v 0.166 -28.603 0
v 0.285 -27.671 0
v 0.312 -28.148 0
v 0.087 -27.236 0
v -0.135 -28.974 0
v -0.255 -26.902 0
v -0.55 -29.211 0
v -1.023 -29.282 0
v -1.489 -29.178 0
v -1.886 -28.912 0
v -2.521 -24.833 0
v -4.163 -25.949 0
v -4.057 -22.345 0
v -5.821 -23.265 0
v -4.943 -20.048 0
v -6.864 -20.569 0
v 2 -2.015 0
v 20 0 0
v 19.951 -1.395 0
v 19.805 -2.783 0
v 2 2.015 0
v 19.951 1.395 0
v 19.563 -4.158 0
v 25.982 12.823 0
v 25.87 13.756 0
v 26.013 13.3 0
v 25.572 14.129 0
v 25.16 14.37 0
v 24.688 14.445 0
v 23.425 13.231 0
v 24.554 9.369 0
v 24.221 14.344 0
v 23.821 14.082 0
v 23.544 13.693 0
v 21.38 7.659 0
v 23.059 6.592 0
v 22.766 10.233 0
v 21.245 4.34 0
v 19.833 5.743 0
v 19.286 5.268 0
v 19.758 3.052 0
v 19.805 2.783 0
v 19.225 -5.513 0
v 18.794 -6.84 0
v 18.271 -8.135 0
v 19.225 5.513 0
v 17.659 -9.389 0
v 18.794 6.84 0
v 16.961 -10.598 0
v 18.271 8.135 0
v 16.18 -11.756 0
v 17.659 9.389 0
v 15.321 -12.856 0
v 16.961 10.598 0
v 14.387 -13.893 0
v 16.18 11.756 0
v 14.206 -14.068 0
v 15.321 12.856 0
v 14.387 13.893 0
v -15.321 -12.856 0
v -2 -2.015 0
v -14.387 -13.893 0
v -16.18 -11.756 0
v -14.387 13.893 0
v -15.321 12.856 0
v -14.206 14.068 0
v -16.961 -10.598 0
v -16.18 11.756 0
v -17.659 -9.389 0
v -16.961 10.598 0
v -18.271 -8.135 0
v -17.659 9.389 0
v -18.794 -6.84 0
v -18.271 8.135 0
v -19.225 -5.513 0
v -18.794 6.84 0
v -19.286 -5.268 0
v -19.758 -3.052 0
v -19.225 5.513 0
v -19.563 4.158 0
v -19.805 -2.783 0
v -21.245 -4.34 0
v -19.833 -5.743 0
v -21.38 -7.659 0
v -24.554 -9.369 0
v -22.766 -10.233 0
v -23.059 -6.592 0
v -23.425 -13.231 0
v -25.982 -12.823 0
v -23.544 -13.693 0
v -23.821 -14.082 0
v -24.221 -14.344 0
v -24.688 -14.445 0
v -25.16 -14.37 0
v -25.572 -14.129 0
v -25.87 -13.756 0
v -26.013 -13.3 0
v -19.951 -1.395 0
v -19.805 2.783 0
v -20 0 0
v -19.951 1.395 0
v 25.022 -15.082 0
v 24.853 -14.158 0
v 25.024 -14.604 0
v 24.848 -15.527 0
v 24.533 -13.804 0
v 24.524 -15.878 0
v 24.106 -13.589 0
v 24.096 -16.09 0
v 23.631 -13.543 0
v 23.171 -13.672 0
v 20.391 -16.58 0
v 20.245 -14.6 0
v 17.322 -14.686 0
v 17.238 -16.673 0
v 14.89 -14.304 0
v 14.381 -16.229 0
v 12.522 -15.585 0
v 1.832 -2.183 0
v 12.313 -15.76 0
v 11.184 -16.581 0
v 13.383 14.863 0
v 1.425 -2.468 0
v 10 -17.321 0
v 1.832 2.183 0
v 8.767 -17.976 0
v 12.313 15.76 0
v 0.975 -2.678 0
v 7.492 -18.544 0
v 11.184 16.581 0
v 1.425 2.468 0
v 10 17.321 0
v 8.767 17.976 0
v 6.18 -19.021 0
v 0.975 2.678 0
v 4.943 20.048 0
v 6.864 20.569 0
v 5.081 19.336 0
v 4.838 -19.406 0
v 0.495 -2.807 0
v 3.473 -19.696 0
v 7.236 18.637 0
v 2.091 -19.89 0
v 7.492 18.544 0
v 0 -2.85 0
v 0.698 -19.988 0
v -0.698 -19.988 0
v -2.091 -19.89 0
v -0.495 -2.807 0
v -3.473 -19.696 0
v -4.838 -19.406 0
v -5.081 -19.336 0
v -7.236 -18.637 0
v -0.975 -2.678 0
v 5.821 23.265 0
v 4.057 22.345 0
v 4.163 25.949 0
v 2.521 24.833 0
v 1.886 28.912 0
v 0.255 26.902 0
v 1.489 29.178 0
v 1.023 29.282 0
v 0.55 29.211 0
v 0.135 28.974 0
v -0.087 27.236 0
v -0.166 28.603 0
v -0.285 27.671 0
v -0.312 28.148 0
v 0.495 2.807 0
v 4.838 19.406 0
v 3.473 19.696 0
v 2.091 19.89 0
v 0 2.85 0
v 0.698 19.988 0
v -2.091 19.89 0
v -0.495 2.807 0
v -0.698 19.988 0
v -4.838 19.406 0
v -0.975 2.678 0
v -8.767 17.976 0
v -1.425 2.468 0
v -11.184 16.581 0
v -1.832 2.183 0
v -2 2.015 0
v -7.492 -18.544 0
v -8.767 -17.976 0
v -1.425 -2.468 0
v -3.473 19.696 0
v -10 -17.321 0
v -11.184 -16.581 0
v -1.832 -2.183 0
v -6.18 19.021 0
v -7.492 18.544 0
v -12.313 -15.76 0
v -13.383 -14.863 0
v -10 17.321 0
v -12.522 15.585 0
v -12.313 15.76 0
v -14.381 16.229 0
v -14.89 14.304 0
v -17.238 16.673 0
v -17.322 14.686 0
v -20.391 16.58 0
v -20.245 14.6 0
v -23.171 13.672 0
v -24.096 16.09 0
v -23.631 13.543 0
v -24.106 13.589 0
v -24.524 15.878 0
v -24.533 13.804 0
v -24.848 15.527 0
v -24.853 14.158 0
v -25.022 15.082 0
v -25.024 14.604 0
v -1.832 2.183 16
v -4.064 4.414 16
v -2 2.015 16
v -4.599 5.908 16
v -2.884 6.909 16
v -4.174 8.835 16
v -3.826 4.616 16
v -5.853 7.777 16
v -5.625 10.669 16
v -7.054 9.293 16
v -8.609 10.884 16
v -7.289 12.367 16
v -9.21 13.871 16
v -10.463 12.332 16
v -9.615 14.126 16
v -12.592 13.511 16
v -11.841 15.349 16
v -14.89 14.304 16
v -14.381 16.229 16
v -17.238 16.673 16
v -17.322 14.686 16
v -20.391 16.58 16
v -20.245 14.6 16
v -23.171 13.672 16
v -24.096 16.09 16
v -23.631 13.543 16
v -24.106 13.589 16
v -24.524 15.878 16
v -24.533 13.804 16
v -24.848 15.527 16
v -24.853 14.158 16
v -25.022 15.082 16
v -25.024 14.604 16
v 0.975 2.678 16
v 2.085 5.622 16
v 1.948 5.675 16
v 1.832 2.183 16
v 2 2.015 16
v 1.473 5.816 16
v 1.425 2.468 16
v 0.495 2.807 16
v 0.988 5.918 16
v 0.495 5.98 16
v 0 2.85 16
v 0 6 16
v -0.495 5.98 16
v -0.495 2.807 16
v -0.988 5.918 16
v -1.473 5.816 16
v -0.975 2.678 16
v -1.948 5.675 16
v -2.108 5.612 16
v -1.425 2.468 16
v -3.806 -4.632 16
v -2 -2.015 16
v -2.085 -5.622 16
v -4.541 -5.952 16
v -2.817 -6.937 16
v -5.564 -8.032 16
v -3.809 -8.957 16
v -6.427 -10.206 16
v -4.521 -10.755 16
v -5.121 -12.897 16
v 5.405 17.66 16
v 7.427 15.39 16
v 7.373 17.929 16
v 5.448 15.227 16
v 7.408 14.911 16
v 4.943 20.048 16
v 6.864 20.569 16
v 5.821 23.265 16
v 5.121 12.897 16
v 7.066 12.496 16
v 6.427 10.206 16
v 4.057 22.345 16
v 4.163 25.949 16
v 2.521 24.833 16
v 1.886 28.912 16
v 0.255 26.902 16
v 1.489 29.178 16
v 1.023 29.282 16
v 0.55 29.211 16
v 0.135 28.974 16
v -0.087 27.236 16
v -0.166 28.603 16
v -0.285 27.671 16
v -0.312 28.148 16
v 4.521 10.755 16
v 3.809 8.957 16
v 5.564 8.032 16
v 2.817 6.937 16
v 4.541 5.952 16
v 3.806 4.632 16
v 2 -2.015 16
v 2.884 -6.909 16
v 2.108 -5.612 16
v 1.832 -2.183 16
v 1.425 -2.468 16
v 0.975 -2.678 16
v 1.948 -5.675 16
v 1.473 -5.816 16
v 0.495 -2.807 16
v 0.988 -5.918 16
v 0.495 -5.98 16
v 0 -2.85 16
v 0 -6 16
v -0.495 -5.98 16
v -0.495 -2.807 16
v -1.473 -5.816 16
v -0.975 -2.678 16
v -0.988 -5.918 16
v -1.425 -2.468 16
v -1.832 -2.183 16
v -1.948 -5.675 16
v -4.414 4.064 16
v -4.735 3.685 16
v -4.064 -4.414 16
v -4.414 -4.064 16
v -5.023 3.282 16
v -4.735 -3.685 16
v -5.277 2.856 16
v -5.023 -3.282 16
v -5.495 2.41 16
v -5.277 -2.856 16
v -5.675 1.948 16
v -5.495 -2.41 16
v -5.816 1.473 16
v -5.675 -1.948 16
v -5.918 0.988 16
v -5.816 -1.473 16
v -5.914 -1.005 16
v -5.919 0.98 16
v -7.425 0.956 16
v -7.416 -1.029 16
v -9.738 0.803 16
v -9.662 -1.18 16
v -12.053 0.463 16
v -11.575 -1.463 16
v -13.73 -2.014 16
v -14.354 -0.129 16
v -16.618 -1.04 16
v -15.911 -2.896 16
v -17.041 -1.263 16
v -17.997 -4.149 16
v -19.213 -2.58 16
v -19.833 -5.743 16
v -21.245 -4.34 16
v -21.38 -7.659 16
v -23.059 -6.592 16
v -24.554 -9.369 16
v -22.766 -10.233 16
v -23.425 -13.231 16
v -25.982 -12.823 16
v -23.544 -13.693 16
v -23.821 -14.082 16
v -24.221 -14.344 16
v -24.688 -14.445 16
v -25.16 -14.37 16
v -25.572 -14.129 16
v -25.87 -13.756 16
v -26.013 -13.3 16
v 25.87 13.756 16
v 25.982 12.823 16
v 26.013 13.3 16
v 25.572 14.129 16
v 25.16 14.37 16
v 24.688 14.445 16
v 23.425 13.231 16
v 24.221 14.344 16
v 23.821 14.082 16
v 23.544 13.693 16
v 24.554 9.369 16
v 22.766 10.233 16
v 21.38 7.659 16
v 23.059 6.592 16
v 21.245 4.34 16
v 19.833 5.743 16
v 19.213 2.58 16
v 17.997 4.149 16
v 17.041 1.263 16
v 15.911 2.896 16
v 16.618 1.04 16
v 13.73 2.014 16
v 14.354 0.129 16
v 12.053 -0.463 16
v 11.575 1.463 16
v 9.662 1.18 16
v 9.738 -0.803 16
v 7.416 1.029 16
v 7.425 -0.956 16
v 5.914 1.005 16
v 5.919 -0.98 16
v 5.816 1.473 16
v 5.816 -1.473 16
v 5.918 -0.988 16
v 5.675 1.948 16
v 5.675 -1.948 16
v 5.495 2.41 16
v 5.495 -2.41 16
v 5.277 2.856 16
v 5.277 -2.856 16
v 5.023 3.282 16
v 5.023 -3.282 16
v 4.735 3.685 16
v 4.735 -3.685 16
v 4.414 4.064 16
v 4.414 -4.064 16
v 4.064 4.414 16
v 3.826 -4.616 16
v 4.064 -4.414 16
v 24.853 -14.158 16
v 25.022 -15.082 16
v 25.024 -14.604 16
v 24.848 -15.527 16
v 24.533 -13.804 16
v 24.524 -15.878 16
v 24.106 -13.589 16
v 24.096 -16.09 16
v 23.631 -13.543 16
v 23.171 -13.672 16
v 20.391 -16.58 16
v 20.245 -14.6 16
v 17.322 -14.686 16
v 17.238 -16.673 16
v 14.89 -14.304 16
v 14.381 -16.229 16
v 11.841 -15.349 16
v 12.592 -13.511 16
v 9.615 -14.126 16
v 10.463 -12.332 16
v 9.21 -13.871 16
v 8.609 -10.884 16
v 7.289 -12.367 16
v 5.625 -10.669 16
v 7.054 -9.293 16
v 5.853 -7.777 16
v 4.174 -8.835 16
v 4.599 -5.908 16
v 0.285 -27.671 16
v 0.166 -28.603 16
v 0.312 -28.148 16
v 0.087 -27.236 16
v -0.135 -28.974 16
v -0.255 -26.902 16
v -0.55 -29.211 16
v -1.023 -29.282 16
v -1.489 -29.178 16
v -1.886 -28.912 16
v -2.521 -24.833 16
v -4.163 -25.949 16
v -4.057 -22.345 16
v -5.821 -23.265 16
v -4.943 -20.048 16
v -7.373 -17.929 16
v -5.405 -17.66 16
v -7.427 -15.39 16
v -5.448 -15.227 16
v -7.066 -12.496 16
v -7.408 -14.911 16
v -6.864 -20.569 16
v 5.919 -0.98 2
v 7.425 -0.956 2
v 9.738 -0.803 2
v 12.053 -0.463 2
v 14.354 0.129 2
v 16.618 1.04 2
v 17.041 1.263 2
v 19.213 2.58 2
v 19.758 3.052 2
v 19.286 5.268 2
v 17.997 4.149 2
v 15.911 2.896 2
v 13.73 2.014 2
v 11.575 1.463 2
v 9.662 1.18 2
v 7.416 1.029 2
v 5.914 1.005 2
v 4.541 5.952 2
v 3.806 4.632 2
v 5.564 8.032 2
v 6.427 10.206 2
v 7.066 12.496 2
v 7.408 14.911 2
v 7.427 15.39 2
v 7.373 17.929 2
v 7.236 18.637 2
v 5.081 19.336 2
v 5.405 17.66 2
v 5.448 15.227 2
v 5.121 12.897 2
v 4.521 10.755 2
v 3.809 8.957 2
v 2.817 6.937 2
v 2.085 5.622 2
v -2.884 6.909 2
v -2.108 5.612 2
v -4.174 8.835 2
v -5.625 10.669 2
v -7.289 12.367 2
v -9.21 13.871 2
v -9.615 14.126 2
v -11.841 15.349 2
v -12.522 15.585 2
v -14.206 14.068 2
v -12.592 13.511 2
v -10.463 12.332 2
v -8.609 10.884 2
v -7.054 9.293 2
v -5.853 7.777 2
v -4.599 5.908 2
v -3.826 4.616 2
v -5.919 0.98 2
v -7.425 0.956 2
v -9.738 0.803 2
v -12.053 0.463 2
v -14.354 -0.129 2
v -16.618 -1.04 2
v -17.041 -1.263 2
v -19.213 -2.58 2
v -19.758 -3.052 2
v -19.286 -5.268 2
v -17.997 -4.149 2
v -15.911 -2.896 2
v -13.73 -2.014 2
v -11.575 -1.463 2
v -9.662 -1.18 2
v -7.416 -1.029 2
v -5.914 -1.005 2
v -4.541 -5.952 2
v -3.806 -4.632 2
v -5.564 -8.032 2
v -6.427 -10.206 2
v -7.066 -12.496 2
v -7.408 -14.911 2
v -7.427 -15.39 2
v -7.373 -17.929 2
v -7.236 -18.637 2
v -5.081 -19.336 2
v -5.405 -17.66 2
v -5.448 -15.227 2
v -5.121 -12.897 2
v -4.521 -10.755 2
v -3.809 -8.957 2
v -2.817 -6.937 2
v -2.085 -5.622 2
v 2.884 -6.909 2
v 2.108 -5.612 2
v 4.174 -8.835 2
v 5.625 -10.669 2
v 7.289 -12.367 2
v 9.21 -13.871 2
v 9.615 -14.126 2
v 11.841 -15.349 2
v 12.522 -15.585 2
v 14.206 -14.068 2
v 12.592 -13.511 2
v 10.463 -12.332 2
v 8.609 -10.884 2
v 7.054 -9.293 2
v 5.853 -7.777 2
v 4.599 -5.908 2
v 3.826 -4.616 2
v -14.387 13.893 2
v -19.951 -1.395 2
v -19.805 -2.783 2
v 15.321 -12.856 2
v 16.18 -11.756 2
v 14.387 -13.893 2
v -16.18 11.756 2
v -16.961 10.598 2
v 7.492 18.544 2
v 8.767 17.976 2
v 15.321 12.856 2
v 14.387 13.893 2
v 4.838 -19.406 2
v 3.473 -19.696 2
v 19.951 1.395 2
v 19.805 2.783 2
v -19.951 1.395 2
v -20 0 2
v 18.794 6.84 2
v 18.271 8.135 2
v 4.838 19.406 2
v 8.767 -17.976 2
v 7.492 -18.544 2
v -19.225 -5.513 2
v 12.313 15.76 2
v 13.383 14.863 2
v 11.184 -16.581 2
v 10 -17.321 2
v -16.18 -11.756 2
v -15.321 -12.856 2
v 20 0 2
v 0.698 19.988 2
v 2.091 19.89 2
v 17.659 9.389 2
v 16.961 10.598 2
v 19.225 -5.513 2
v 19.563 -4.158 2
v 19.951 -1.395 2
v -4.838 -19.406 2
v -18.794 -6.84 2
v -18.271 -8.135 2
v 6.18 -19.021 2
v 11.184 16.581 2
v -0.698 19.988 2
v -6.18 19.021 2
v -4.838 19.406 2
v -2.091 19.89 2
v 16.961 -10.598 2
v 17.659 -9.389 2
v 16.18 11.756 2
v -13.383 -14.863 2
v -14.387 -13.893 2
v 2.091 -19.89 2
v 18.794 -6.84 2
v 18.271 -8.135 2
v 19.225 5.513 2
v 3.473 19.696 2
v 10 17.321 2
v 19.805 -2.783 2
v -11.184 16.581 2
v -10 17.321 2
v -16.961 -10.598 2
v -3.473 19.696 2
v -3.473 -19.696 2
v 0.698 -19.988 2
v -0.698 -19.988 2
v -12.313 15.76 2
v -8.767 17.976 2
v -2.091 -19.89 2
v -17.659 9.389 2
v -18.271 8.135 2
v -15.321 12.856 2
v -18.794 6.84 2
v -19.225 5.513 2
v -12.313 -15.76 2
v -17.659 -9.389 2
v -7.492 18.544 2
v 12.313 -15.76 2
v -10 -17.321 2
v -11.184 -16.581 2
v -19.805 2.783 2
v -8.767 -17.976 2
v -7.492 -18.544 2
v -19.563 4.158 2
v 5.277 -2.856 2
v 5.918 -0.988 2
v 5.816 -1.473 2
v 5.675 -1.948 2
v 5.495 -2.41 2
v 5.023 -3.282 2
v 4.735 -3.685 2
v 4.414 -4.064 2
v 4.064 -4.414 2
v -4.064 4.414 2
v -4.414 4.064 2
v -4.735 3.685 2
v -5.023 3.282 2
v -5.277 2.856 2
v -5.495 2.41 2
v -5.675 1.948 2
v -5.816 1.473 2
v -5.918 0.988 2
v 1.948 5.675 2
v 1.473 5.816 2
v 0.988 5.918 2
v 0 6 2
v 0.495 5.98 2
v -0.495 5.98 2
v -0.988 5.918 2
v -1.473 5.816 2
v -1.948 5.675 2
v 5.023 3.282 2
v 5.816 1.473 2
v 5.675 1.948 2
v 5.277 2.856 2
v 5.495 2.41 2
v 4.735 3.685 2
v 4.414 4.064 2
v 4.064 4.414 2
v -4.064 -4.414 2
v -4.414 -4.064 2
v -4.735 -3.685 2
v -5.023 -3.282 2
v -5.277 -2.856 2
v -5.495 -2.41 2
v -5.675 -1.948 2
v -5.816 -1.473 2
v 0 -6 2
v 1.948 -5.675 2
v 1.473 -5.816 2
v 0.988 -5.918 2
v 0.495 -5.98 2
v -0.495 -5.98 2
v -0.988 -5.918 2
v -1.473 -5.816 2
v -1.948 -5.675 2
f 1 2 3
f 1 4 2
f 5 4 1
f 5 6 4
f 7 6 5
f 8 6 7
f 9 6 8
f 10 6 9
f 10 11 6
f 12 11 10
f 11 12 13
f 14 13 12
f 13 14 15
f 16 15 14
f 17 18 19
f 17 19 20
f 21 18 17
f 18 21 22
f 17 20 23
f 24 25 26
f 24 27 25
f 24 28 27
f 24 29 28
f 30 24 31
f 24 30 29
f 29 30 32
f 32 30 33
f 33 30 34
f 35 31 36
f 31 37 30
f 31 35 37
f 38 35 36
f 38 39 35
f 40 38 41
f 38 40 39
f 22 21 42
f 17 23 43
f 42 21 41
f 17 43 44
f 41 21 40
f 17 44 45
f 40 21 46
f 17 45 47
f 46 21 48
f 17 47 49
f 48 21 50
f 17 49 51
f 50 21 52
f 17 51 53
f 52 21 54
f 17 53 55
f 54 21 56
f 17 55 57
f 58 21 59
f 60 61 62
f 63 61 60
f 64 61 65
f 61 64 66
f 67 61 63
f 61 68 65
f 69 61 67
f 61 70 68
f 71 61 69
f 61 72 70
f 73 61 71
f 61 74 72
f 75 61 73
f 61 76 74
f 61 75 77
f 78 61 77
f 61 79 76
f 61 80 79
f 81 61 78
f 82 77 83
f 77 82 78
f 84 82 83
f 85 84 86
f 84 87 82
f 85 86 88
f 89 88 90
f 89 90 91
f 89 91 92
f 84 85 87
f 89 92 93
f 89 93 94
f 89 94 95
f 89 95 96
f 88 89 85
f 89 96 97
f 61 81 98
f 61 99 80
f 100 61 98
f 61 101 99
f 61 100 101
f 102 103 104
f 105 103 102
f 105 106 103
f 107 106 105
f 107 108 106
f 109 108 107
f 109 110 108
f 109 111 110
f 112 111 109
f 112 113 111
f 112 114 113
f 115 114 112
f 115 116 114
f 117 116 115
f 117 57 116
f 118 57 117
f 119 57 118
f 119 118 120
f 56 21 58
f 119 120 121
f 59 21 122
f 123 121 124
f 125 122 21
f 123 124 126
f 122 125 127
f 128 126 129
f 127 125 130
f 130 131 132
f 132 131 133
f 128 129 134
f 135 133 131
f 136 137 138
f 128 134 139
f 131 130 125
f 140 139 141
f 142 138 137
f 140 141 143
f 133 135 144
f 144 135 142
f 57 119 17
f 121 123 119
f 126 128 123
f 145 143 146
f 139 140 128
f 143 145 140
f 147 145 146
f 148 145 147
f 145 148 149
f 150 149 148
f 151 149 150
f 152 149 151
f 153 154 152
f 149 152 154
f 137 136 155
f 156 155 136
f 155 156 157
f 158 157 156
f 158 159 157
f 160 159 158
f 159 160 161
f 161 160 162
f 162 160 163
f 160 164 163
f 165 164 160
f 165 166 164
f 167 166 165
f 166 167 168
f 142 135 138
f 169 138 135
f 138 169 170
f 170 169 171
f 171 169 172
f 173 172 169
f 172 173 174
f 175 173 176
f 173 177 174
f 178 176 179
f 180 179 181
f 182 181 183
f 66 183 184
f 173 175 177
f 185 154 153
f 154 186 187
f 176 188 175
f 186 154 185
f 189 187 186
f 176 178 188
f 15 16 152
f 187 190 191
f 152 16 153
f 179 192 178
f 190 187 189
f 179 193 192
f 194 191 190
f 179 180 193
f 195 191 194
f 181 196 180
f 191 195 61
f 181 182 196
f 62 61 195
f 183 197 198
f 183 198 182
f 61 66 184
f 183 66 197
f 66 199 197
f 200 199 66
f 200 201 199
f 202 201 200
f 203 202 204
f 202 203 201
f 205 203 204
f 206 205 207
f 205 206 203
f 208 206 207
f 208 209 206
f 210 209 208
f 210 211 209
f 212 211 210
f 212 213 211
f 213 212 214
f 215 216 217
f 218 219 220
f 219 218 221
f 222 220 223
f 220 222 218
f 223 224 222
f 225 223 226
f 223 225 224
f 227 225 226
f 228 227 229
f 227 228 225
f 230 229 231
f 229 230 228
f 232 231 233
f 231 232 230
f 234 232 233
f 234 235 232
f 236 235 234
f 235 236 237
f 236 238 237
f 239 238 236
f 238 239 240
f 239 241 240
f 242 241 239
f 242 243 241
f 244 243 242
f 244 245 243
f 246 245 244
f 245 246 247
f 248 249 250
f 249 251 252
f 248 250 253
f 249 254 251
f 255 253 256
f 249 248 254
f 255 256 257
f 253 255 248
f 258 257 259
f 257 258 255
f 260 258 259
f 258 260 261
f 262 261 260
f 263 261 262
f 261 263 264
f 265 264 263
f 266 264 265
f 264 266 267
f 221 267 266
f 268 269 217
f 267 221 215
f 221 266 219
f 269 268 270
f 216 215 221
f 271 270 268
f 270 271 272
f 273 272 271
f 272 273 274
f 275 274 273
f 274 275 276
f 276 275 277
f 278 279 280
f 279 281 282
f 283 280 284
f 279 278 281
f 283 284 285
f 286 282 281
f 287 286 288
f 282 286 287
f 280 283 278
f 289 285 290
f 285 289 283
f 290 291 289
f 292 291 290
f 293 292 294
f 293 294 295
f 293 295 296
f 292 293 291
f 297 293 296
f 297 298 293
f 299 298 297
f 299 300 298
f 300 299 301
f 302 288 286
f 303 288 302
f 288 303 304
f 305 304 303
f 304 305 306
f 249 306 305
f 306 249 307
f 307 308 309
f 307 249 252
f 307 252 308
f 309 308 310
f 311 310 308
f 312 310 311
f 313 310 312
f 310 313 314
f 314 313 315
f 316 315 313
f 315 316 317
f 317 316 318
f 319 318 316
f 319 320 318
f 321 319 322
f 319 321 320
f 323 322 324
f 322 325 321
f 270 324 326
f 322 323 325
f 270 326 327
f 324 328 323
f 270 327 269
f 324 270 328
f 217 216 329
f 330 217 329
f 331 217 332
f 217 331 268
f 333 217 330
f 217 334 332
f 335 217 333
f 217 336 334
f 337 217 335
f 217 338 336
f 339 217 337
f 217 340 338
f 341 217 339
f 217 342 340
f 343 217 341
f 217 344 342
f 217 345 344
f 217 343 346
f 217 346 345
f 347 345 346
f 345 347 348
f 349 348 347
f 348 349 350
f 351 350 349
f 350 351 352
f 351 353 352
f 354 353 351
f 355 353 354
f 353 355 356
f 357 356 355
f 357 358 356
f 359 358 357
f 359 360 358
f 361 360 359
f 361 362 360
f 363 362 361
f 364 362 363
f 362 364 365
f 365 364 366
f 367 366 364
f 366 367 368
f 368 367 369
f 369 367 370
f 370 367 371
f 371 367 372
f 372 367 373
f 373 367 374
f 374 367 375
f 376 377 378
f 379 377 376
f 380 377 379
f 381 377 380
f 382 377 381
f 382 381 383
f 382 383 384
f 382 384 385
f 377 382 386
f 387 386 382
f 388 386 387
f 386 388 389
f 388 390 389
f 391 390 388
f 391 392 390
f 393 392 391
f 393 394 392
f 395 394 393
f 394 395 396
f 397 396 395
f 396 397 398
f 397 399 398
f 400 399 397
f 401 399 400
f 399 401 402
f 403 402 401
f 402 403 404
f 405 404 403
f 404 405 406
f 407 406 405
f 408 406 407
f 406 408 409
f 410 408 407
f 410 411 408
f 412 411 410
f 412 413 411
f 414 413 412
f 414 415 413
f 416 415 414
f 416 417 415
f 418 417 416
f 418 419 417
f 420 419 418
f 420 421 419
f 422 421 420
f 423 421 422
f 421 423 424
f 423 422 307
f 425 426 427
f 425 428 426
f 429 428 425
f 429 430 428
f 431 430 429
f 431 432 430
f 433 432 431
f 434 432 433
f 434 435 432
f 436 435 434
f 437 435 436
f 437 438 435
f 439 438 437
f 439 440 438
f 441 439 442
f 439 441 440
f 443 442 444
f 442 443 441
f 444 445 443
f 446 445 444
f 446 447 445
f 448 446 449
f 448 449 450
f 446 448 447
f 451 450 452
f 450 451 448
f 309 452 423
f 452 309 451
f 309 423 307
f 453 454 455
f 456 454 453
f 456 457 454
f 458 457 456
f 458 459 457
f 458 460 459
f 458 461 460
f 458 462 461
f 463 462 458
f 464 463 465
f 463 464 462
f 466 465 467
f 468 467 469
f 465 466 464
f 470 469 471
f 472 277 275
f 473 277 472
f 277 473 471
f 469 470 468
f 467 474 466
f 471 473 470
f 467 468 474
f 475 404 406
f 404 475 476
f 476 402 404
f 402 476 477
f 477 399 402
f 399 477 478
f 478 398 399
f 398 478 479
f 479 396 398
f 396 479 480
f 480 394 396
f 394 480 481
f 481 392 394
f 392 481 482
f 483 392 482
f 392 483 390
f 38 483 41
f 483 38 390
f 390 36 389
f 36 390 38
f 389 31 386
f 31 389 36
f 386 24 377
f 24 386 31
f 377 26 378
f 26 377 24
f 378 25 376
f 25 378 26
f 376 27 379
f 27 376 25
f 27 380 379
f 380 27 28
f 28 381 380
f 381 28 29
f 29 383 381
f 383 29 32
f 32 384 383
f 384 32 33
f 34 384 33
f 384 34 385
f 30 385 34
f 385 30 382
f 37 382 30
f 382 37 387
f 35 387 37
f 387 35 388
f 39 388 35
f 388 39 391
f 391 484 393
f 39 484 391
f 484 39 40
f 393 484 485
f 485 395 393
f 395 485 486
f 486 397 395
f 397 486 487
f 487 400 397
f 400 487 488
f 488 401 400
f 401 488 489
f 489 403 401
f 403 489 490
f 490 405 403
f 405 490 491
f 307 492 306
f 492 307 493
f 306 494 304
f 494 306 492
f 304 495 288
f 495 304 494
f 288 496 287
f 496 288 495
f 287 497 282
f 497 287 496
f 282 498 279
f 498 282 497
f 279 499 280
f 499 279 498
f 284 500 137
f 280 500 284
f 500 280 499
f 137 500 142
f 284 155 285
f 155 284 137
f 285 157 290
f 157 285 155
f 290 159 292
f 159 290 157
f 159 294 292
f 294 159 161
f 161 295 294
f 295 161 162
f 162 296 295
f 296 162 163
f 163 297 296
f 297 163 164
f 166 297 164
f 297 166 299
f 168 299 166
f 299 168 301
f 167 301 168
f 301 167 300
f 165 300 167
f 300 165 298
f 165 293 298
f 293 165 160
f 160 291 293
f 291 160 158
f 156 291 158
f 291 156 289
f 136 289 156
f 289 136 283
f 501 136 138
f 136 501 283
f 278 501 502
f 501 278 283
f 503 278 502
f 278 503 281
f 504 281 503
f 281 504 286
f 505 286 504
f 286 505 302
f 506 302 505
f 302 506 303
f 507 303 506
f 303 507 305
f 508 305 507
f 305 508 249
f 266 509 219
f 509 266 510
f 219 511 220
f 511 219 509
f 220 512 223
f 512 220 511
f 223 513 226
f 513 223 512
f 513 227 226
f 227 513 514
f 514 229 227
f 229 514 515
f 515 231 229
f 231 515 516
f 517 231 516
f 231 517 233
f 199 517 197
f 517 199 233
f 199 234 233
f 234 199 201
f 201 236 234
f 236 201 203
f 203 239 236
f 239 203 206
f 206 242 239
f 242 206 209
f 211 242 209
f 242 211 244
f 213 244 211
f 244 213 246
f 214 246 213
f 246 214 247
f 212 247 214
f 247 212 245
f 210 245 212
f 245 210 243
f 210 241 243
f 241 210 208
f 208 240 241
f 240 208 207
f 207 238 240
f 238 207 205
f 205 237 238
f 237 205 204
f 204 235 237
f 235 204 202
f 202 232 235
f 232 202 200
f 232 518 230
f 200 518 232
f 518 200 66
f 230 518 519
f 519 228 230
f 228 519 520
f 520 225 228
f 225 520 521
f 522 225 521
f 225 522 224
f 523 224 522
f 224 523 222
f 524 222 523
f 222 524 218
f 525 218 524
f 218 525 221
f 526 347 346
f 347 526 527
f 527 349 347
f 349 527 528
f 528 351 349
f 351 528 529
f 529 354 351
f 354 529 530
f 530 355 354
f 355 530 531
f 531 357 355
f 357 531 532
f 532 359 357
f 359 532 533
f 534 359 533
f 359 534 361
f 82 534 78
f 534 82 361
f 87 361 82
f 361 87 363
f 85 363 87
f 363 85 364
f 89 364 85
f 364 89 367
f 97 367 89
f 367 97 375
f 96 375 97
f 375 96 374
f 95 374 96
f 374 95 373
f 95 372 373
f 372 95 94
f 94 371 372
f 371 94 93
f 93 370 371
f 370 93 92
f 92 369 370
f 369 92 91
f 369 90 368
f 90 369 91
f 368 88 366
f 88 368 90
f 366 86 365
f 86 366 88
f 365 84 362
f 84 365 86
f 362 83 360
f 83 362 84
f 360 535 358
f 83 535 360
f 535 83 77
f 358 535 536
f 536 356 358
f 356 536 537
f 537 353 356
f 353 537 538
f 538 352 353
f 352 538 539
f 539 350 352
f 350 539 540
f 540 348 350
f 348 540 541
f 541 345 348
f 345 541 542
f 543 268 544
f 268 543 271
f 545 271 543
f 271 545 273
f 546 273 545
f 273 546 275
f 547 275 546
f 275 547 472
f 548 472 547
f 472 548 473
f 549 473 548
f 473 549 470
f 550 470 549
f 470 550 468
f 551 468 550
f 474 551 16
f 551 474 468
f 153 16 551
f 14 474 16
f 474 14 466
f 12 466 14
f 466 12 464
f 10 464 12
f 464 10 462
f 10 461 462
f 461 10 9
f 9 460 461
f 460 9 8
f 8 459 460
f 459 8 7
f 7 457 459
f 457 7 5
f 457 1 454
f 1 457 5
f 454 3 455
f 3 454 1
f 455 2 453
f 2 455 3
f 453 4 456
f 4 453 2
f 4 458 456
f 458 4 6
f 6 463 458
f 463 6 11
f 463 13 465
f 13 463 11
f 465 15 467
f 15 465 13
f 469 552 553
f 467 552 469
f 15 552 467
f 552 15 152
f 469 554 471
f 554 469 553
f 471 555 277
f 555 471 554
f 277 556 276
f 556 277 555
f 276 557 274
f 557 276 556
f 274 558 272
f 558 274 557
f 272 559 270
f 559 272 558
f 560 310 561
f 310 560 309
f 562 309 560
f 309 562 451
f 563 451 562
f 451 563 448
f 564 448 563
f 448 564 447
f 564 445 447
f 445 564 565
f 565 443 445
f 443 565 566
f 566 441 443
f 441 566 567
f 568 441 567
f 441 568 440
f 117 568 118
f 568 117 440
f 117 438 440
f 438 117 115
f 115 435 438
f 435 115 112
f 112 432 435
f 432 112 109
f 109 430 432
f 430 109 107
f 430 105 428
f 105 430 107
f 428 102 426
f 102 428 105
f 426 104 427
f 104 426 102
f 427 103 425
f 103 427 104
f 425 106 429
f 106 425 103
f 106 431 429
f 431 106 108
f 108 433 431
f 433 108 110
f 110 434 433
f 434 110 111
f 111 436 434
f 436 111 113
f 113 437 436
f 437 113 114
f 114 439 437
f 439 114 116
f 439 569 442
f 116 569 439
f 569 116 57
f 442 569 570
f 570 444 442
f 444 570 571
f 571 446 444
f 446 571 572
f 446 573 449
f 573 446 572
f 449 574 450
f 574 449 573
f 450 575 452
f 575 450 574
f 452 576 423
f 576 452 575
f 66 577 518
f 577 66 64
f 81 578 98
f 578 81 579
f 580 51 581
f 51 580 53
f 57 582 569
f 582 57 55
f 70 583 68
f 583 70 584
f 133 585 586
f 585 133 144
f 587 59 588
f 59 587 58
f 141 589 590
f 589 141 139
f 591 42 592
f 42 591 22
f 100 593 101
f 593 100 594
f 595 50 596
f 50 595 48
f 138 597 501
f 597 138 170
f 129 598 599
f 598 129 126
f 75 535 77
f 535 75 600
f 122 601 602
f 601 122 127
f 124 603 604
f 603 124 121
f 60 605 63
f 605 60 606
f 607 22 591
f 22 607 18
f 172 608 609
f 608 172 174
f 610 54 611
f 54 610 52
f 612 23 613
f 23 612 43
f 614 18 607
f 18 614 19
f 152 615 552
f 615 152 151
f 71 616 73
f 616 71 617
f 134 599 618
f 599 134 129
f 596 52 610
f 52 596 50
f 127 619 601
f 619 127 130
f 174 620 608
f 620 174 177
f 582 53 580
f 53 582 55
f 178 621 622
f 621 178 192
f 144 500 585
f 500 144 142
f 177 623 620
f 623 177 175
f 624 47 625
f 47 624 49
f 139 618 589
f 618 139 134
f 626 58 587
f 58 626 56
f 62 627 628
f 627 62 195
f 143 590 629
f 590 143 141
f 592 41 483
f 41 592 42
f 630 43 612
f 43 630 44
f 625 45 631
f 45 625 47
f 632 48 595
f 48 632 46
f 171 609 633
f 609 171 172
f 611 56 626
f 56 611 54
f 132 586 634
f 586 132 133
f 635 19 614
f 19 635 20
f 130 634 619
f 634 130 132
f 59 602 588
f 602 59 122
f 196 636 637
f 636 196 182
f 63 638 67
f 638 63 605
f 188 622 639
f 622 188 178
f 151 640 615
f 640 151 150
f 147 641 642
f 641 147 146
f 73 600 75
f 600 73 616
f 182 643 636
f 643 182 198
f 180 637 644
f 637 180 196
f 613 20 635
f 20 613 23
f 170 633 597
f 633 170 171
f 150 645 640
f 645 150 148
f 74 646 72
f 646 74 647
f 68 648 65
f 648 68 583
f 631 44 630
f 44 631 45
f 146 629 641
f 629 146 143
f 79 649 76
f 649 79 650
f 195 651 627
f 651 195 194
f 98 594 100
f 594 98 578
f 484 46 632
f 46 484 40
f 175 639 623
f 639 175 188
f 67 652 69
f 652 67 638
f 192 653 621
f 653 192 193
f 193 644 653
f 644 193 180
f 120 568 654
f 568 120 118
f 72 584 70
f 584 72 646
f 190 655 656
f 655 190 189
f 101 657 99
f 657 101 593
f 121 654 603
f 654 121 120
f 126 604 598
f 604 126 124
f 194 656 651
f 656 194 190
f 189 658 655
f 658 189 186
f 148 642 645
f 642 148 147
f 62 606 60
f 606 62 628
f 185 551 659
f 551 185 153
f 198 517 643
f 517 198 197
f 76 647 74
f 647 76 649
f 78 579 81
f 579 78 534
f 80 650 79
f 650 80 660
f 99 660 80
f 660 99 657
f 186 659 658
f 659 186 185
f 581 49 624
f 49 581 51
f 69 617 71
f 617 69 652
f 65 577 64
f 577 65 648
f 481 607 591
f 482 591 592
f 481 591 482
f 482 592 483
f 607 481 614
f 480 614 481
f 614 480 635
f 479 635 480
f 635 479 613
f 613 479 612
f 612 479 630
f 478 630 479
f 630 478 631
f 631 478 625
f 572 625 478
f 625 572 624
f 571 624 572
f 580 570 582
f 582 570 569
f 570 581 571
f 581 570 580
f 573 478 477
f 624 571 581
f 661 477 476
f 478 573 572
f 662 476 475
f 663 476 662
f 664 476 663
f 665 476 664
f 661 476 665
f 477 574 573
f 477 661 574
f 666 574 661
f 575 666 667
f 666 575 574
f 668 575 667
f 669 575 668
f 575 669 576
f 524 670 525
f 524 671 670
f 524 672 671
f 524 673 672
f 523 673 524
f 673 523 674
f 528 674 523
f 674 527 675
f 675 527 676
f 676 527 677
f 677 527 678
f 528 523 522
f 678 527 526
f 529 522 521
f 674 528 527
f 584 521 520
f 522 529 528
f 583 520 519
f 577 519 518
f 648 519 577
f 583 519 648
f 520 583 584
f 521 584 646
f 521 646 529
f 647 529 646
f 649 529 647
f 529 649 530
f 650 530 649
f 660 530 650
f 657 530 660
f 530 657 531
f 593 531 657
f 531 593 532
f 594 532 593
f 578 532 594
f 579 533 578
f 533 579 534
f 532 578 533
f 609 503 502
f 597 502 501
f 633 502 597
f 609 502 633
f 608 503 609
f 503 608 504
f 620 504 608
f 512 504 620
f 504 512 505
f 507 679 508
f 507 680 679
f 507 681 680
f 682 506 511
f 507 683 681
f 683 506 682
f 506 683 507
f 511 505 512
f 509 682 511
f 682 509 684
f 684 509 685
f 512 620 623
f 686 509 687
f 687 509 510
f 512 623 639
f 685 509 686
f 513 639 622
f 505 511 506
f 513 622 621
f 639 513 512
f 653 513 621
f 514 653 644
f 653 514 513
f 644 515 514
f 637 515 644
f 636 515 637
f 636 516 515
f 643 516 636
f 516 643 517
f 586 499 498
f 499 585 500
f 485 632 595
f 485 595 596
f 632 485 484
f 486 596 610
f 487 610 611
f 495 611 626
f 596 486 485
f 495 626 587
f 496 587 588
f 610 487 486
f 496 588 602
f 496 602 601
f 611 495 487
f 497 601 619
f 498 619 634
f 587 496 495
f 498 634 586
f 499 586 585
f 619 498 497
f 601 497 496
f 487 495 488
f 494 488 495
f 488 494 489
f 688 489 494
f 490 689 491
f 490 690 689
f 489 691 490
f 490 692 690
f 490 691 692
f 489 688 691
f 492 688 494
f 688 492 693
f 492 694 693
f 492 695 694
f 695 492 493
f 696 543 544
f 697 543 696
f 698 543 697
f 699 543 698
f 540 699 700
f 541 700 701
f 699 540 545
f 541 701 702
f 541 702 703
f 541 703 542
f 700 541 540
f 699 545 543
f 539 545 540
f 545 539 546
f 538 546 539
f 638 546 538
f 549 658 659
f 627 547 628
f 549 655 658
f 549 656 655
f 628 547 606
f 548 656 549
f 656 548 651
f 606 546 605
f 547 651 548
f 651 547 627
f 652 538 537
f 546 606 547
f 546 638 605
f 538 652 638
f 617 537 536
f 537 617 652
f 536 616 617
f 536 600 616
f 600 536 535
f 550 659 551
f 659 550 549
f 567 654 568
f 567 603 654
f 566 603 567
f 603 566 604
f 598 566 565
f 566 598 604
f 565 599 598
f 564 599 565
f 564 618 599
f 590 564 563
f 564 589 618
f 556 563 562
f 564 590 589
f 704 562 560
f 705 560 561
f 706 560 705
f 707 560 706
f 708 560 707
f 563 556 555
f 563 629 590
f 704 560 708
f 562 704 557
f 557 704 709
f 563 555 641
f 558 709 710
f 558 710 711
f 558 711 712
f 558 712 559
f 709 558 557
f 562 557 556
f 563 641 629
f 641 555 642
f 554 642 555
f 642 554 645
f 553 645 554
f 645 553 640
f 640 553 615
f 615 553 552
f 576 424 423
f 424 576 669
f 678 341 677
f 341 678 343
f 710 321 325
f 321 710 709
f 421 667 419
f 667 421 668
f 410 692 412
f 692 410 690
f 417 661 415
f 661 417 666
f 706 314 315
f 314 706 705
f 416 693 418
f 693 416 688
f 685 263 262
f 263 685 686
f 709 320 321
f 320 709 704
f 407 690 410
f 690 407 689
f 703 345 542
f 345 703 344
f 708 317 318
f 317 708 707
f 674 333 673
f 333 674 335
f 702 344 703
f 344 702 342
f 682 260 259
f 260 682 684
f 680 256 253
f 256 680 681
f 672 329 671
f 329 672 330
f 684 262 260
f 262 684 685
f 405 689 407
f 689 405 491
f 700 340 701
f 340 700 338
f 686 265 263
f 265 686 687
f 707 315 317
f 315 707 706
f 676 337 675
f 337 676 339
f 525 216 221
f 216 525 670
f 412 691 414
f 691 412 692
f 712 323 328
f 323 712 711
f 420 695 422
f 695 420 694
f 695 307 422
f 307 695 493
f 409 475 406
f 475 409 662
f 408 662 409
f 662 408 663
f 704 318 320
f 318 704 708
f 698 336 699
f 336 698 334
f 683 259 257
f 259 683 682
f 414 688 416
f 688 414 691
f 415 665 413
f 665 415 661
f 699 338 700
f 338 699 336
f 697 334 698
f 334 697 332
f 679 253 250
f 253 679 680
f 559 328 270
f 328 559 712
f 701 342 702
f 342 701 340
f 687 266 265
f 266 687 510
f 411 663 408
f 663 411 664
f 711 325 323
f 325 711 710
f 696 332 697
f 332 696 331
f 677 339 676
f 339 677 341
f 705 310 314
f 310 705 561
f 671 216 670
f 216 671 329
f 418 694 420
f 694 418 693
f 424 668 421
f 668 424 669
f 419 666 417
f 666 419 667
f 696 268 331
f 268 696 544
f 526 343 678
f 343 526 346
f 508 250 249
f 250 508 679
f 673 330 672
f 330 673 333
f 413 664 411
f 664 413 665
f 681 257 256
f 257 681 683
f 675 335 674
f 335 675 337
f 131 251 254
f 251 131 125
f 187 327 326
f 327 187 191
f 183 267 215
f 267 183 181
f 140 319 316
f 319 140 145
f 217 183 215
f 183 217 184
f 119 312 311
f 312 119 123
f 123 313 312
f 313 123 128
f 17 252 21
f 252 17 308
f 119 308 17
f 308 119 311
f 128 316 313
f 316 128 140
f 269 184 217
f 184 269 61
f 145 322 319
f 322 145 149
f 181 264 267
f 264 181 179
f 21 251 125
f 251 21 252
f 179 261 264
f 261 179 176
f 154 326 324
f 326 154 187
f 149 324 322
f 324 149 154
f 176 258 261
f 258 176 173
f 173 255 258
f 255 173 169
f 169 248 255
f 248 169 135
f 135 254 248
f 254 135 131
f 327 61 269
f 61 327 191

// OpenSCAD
// file: common/shapes.scad
// Formas 2D reaproveitadas pelas peças. Use com `use <common/shapes.scad>`.

// Pontos de uma superelipse, centrada na origem.
//   a, b   meio comprimento e meia largura (mm)
//   n      2 é elipse; quanto maior, mais "quadrada" a borda
//   steps  quantos pontos no contorno
function superellipse_points(a, b, n, steps = 120) = [
    for (i = [0:steps - 1])
        let(t = 360 * i / steps, c = cos(t), s = sin(t))
            [a * sign(c) * pow(abs(c), 2 / n), b * sign(s) * pow(abs(s), 2 / n)]
];

// Contorno de casco: superelipse com o tamanho total, centrada.
//   length, width  comprimento e largura totais (mm)
//   n              forma, como em superellipse_points
module hull_outline(length, width, n) {
    polygon(superellipse_points(length / 2, width / 2, n));
}

// Retângulo de cantos arredondados, centrado.
//   length, width  tamanho total (mm)
//   radius         raio dos cantos (mm)
module rounded_rect(length, width, radius) {
    offset(r = radius) square([length - 2 * radius, width - 2 * radius],
                              center = true);
}

// Linhas de uma grade hexagonal — os gomos do casco da tartaruga. Colunas ao
// longo de Y; gire 90° pra deixar a fileira do meio ao longo do barco.
//   size         tamanho do gomo, de canto a canto (mm)
//   ridge_width  largura da linha entre os gomos (mm)
module hex_grid_lines(size, ridge_width) {
    r = size / 2;
    w = ridge_width / cos(30);
    for (i = [-7:7], j = [-7:7])
        translate([i * 1.5 * r,
                   j * sqrt(3) * r + (abs(i) % 2) * sqrt(3) * r / 2])
            difference() {
                circle(r = r + w / 2, $fn = 6);
                circle(r = r - w / 2, $fn = 6);
            }
}

// Furo de eixo "D duplo" do motor TT: redondo cortado por duas faces planas.
//   diameter  no redondo (mm)
//   flat      entre as faces planas (mm)
module double_d_hole(diameter, flat) {
    intersection() {
        circle(d = diameter);
        square([flat, diameter], center = true);
    }
}
// file: common/dimensions.scad
// Medidas compartilhadas da DonaTelos, em milímetros.
//
// Cada número diz de onde veio. Sem fonte, leva "a medir" ou "chute" — e
// vira medida de paquímetro assim que a peça chegar.

// ---------------------------------------------------------------- Impressora

// Mesa da mini do dono da impressora (informado em 13/11/2026)
bed_size = 180;
// Altura máxima de impressão — a confirmar com o dono da impressora
bed_height = 180; // a medir

// ---------------------------------------------------------------- Folgas

// Folga de encaixe entre peças — chute; calibrar com uma peça de teste
fit_clearance = 0.3;
// Folga do furo do eixo na roda de pá — chute; o eixo deve entrar justo
shaft_clearance = 0.15;

// ---------------------------------------------------------------- Motor TT

// Fonte: desenho do fabricante na página do motor TT 1:48 da Adafruit
// (produto 3777). Conferir com paquímetro quando o motor chegar.
tt_gearbox_length = 37.0; // caixa amarela, sem a orelha
tt_tab_length = 4.8; // orelha de fixação na ponta da caixa
tt_total_length = 70.0; // do fundo do motor até a ponta da orelha
tt_height = 22.44; // altura da caixa (perpendicular ao eixo)
tt_thickness = 18.6; // espessura da caixa (ao longo do eixo)
tt_can_height = 22.4; // motor prateado, mesma direção da altura
tt_can_thickness = 19.0; // motor prateado, mesma direção da espessura
tt_shaft_from_end = 14.0; // centro do eixo até a ponta da caixa (sem orelha)
tt_shaft_diameter = 5.4; // eixo, no redondo
tt_shaft_flat = 3.7; // eixo, entre as duas faces planas
tt_shaft_length = 8.7; // quanto o eixo sai da caixa (o lado mais curto)
tt_shaft_length_long = 9.3; // o outro lado do eixo duplo
tt_hole_diameter = 3.0; // furo de fixação

// ---------------------------------------------------------------- Roda de pá

// Igual nos dois caminhos do casco
wheel_radius = 28; // chute — afinar no teste da bacia (quanto a pá molha)
wheel_width = 16; // largura da pá, ao longo do eixo

// ---------------------------------------------------------------- Eletrônica

// Célula 18650 GoldHill — página da loja: Ø18 x 65 mm
cell_diameter = 18;
cell_length = 65;
// Suporte de 1 célula — chute; medir quando chegar
holder_length = 77; // a medir
holder_width = 21; // a medir
holder_height = 19; // a medir
// Placa fenolite 5x7 cm — página da loja
board_length = 70;
board_width = 50;
board_thickness = 1.6; // chute — fenolite comum
board_hole_inset = 2.5; // a medir — furo do canto até a borda
// Altura das peças em cima da placa (ESP, ponte H, bornes) — chute
board_parts_height = 15; // a medir
// Chave gangorra KCD11 — recorte no painel
switch_cutout_length = 19; // a medir
switch_cutout_width = 13; // a medir
// main file
// Roda de pá — a "nadadeira" da DonaTelos. Serve pros dois caminhos do casco.
//
// Imprime deitada: o disco no chão da mesa, as pás e o cubo pra cima, sem
// suporte. São duas iguais — a do outro lado é a mesma peça virada.

include <common/dimensions.scad>
use <common/shapes.scad>

$fa = 4;
$fs = 0.5;

// ---------------------------------------------------------------- Peça

// As medidas compartilhadas (roda, eixo do motor, folga) vêm de
// common/dimensions.scad; as da própria roda são o padrão do módulo
paddle_wheel(
    radius = wheel_radius,
    width = wheel_width,
    shaft_diameter = tt_shaft_diameter,
    shaft_flat = tt_shaft_flat,
    clearance = shaft_clearance
);

// ---------------------------------------------------------------- Módulos

// Roda de pá: disco de um lado, cubo no meio e pás em concha, com o furo
// "D duplo" do eixo do motor TT.
//   radius            raio até a ponta da pá (mm)
//   width             largura da pá, ao longo do eixo (mm)
//   shaft_diameter    eixo do motor, no redondo (mm)
//   shaft_flat        eixo do motor, entre as faces planas (mm)
//   clearance         folga do furo do eixo, de cada lado (mm)
//   paddle_count      quantas pás
//   paddle_thickness  espessura da pá (mm)
//   paddle_sweep      curvatura da pá (graus) — pá em concha empurra mais
//   hub_diameter      cubo (mm)
//   disc_radius       disco de um lado só: firma as pás sem esconder a forma
//   disc_thickness    espessura do disco (mm)
module paddle_wheel(radius, width, shaft_diameter, shaft_flat, clearance,
                    paddle_count = 6, paddle_thickness = 2.0,
                    paddle_sweep = 28, hub_diameter = 12, disc_radius = 20,
                    disc_thickness = 2.0) {
    difference() {
        union() {
            cylinder(r = disc_radius, h = disc_thickness);
            cylinder(d = hub_diameter, h = width);
            for (i = [0:paddle_count - 1])
                rotate([0, 0, i * 360 / paddle_count])
                    linear_extrude(height = width)
                        paddle_blade(hub_diameter / 2 - 1, radius,
                                     paddle_thickness, paddle_sweep);
        }
        // Furo do eixo, justo
        translate([0, 0, -1])
            linear_extrude(height = width + 2)
                double_d_hole(shaft_diameter + 2 * clearance,
                              shaft_flat + 2 * clearance);
    }
}

// Pá curva, em 2D, do cubo até a borda: uma corrente de círculos ao longo do
// arco.
//   inner_radius  onde a pá começa (mm)
//   outer_radius  onde a pá termina (mm)
//   thickness     espessura da pá (mm)
//   sweep         curvatura (graus)
module paddle_blade(inner_radius, outer_radius, thickness, sweep) {
    steps = 10;
    for (k = [0:steps - 1])
        hull() {
            blade_point(inner_radius, outer_radius, thickness, sweep,
                        k / steps);
            blade_point(inner_radius, outer_radius, thickness, sweep,
                        (k + 1) / steps);
        }
}

// Um ponto da pá, em 2D: t vai de 0 (no cubo) a 1 (na borda); a ponta é um
// pouco mais grossa. Os outros parâmetros são os de paddle_blade.
module blade_point(inner_radius, outer_radius, thickness, sweep, t) {
    r = inner_radius + t * (outer_radius - inner_radius);
    angle = sweep * t * t;
    rotate([0, 0, angle])
        translate([r, 0])
            circle(d = thickness * (t < 0.95 ? 1 : 1.3));
}
